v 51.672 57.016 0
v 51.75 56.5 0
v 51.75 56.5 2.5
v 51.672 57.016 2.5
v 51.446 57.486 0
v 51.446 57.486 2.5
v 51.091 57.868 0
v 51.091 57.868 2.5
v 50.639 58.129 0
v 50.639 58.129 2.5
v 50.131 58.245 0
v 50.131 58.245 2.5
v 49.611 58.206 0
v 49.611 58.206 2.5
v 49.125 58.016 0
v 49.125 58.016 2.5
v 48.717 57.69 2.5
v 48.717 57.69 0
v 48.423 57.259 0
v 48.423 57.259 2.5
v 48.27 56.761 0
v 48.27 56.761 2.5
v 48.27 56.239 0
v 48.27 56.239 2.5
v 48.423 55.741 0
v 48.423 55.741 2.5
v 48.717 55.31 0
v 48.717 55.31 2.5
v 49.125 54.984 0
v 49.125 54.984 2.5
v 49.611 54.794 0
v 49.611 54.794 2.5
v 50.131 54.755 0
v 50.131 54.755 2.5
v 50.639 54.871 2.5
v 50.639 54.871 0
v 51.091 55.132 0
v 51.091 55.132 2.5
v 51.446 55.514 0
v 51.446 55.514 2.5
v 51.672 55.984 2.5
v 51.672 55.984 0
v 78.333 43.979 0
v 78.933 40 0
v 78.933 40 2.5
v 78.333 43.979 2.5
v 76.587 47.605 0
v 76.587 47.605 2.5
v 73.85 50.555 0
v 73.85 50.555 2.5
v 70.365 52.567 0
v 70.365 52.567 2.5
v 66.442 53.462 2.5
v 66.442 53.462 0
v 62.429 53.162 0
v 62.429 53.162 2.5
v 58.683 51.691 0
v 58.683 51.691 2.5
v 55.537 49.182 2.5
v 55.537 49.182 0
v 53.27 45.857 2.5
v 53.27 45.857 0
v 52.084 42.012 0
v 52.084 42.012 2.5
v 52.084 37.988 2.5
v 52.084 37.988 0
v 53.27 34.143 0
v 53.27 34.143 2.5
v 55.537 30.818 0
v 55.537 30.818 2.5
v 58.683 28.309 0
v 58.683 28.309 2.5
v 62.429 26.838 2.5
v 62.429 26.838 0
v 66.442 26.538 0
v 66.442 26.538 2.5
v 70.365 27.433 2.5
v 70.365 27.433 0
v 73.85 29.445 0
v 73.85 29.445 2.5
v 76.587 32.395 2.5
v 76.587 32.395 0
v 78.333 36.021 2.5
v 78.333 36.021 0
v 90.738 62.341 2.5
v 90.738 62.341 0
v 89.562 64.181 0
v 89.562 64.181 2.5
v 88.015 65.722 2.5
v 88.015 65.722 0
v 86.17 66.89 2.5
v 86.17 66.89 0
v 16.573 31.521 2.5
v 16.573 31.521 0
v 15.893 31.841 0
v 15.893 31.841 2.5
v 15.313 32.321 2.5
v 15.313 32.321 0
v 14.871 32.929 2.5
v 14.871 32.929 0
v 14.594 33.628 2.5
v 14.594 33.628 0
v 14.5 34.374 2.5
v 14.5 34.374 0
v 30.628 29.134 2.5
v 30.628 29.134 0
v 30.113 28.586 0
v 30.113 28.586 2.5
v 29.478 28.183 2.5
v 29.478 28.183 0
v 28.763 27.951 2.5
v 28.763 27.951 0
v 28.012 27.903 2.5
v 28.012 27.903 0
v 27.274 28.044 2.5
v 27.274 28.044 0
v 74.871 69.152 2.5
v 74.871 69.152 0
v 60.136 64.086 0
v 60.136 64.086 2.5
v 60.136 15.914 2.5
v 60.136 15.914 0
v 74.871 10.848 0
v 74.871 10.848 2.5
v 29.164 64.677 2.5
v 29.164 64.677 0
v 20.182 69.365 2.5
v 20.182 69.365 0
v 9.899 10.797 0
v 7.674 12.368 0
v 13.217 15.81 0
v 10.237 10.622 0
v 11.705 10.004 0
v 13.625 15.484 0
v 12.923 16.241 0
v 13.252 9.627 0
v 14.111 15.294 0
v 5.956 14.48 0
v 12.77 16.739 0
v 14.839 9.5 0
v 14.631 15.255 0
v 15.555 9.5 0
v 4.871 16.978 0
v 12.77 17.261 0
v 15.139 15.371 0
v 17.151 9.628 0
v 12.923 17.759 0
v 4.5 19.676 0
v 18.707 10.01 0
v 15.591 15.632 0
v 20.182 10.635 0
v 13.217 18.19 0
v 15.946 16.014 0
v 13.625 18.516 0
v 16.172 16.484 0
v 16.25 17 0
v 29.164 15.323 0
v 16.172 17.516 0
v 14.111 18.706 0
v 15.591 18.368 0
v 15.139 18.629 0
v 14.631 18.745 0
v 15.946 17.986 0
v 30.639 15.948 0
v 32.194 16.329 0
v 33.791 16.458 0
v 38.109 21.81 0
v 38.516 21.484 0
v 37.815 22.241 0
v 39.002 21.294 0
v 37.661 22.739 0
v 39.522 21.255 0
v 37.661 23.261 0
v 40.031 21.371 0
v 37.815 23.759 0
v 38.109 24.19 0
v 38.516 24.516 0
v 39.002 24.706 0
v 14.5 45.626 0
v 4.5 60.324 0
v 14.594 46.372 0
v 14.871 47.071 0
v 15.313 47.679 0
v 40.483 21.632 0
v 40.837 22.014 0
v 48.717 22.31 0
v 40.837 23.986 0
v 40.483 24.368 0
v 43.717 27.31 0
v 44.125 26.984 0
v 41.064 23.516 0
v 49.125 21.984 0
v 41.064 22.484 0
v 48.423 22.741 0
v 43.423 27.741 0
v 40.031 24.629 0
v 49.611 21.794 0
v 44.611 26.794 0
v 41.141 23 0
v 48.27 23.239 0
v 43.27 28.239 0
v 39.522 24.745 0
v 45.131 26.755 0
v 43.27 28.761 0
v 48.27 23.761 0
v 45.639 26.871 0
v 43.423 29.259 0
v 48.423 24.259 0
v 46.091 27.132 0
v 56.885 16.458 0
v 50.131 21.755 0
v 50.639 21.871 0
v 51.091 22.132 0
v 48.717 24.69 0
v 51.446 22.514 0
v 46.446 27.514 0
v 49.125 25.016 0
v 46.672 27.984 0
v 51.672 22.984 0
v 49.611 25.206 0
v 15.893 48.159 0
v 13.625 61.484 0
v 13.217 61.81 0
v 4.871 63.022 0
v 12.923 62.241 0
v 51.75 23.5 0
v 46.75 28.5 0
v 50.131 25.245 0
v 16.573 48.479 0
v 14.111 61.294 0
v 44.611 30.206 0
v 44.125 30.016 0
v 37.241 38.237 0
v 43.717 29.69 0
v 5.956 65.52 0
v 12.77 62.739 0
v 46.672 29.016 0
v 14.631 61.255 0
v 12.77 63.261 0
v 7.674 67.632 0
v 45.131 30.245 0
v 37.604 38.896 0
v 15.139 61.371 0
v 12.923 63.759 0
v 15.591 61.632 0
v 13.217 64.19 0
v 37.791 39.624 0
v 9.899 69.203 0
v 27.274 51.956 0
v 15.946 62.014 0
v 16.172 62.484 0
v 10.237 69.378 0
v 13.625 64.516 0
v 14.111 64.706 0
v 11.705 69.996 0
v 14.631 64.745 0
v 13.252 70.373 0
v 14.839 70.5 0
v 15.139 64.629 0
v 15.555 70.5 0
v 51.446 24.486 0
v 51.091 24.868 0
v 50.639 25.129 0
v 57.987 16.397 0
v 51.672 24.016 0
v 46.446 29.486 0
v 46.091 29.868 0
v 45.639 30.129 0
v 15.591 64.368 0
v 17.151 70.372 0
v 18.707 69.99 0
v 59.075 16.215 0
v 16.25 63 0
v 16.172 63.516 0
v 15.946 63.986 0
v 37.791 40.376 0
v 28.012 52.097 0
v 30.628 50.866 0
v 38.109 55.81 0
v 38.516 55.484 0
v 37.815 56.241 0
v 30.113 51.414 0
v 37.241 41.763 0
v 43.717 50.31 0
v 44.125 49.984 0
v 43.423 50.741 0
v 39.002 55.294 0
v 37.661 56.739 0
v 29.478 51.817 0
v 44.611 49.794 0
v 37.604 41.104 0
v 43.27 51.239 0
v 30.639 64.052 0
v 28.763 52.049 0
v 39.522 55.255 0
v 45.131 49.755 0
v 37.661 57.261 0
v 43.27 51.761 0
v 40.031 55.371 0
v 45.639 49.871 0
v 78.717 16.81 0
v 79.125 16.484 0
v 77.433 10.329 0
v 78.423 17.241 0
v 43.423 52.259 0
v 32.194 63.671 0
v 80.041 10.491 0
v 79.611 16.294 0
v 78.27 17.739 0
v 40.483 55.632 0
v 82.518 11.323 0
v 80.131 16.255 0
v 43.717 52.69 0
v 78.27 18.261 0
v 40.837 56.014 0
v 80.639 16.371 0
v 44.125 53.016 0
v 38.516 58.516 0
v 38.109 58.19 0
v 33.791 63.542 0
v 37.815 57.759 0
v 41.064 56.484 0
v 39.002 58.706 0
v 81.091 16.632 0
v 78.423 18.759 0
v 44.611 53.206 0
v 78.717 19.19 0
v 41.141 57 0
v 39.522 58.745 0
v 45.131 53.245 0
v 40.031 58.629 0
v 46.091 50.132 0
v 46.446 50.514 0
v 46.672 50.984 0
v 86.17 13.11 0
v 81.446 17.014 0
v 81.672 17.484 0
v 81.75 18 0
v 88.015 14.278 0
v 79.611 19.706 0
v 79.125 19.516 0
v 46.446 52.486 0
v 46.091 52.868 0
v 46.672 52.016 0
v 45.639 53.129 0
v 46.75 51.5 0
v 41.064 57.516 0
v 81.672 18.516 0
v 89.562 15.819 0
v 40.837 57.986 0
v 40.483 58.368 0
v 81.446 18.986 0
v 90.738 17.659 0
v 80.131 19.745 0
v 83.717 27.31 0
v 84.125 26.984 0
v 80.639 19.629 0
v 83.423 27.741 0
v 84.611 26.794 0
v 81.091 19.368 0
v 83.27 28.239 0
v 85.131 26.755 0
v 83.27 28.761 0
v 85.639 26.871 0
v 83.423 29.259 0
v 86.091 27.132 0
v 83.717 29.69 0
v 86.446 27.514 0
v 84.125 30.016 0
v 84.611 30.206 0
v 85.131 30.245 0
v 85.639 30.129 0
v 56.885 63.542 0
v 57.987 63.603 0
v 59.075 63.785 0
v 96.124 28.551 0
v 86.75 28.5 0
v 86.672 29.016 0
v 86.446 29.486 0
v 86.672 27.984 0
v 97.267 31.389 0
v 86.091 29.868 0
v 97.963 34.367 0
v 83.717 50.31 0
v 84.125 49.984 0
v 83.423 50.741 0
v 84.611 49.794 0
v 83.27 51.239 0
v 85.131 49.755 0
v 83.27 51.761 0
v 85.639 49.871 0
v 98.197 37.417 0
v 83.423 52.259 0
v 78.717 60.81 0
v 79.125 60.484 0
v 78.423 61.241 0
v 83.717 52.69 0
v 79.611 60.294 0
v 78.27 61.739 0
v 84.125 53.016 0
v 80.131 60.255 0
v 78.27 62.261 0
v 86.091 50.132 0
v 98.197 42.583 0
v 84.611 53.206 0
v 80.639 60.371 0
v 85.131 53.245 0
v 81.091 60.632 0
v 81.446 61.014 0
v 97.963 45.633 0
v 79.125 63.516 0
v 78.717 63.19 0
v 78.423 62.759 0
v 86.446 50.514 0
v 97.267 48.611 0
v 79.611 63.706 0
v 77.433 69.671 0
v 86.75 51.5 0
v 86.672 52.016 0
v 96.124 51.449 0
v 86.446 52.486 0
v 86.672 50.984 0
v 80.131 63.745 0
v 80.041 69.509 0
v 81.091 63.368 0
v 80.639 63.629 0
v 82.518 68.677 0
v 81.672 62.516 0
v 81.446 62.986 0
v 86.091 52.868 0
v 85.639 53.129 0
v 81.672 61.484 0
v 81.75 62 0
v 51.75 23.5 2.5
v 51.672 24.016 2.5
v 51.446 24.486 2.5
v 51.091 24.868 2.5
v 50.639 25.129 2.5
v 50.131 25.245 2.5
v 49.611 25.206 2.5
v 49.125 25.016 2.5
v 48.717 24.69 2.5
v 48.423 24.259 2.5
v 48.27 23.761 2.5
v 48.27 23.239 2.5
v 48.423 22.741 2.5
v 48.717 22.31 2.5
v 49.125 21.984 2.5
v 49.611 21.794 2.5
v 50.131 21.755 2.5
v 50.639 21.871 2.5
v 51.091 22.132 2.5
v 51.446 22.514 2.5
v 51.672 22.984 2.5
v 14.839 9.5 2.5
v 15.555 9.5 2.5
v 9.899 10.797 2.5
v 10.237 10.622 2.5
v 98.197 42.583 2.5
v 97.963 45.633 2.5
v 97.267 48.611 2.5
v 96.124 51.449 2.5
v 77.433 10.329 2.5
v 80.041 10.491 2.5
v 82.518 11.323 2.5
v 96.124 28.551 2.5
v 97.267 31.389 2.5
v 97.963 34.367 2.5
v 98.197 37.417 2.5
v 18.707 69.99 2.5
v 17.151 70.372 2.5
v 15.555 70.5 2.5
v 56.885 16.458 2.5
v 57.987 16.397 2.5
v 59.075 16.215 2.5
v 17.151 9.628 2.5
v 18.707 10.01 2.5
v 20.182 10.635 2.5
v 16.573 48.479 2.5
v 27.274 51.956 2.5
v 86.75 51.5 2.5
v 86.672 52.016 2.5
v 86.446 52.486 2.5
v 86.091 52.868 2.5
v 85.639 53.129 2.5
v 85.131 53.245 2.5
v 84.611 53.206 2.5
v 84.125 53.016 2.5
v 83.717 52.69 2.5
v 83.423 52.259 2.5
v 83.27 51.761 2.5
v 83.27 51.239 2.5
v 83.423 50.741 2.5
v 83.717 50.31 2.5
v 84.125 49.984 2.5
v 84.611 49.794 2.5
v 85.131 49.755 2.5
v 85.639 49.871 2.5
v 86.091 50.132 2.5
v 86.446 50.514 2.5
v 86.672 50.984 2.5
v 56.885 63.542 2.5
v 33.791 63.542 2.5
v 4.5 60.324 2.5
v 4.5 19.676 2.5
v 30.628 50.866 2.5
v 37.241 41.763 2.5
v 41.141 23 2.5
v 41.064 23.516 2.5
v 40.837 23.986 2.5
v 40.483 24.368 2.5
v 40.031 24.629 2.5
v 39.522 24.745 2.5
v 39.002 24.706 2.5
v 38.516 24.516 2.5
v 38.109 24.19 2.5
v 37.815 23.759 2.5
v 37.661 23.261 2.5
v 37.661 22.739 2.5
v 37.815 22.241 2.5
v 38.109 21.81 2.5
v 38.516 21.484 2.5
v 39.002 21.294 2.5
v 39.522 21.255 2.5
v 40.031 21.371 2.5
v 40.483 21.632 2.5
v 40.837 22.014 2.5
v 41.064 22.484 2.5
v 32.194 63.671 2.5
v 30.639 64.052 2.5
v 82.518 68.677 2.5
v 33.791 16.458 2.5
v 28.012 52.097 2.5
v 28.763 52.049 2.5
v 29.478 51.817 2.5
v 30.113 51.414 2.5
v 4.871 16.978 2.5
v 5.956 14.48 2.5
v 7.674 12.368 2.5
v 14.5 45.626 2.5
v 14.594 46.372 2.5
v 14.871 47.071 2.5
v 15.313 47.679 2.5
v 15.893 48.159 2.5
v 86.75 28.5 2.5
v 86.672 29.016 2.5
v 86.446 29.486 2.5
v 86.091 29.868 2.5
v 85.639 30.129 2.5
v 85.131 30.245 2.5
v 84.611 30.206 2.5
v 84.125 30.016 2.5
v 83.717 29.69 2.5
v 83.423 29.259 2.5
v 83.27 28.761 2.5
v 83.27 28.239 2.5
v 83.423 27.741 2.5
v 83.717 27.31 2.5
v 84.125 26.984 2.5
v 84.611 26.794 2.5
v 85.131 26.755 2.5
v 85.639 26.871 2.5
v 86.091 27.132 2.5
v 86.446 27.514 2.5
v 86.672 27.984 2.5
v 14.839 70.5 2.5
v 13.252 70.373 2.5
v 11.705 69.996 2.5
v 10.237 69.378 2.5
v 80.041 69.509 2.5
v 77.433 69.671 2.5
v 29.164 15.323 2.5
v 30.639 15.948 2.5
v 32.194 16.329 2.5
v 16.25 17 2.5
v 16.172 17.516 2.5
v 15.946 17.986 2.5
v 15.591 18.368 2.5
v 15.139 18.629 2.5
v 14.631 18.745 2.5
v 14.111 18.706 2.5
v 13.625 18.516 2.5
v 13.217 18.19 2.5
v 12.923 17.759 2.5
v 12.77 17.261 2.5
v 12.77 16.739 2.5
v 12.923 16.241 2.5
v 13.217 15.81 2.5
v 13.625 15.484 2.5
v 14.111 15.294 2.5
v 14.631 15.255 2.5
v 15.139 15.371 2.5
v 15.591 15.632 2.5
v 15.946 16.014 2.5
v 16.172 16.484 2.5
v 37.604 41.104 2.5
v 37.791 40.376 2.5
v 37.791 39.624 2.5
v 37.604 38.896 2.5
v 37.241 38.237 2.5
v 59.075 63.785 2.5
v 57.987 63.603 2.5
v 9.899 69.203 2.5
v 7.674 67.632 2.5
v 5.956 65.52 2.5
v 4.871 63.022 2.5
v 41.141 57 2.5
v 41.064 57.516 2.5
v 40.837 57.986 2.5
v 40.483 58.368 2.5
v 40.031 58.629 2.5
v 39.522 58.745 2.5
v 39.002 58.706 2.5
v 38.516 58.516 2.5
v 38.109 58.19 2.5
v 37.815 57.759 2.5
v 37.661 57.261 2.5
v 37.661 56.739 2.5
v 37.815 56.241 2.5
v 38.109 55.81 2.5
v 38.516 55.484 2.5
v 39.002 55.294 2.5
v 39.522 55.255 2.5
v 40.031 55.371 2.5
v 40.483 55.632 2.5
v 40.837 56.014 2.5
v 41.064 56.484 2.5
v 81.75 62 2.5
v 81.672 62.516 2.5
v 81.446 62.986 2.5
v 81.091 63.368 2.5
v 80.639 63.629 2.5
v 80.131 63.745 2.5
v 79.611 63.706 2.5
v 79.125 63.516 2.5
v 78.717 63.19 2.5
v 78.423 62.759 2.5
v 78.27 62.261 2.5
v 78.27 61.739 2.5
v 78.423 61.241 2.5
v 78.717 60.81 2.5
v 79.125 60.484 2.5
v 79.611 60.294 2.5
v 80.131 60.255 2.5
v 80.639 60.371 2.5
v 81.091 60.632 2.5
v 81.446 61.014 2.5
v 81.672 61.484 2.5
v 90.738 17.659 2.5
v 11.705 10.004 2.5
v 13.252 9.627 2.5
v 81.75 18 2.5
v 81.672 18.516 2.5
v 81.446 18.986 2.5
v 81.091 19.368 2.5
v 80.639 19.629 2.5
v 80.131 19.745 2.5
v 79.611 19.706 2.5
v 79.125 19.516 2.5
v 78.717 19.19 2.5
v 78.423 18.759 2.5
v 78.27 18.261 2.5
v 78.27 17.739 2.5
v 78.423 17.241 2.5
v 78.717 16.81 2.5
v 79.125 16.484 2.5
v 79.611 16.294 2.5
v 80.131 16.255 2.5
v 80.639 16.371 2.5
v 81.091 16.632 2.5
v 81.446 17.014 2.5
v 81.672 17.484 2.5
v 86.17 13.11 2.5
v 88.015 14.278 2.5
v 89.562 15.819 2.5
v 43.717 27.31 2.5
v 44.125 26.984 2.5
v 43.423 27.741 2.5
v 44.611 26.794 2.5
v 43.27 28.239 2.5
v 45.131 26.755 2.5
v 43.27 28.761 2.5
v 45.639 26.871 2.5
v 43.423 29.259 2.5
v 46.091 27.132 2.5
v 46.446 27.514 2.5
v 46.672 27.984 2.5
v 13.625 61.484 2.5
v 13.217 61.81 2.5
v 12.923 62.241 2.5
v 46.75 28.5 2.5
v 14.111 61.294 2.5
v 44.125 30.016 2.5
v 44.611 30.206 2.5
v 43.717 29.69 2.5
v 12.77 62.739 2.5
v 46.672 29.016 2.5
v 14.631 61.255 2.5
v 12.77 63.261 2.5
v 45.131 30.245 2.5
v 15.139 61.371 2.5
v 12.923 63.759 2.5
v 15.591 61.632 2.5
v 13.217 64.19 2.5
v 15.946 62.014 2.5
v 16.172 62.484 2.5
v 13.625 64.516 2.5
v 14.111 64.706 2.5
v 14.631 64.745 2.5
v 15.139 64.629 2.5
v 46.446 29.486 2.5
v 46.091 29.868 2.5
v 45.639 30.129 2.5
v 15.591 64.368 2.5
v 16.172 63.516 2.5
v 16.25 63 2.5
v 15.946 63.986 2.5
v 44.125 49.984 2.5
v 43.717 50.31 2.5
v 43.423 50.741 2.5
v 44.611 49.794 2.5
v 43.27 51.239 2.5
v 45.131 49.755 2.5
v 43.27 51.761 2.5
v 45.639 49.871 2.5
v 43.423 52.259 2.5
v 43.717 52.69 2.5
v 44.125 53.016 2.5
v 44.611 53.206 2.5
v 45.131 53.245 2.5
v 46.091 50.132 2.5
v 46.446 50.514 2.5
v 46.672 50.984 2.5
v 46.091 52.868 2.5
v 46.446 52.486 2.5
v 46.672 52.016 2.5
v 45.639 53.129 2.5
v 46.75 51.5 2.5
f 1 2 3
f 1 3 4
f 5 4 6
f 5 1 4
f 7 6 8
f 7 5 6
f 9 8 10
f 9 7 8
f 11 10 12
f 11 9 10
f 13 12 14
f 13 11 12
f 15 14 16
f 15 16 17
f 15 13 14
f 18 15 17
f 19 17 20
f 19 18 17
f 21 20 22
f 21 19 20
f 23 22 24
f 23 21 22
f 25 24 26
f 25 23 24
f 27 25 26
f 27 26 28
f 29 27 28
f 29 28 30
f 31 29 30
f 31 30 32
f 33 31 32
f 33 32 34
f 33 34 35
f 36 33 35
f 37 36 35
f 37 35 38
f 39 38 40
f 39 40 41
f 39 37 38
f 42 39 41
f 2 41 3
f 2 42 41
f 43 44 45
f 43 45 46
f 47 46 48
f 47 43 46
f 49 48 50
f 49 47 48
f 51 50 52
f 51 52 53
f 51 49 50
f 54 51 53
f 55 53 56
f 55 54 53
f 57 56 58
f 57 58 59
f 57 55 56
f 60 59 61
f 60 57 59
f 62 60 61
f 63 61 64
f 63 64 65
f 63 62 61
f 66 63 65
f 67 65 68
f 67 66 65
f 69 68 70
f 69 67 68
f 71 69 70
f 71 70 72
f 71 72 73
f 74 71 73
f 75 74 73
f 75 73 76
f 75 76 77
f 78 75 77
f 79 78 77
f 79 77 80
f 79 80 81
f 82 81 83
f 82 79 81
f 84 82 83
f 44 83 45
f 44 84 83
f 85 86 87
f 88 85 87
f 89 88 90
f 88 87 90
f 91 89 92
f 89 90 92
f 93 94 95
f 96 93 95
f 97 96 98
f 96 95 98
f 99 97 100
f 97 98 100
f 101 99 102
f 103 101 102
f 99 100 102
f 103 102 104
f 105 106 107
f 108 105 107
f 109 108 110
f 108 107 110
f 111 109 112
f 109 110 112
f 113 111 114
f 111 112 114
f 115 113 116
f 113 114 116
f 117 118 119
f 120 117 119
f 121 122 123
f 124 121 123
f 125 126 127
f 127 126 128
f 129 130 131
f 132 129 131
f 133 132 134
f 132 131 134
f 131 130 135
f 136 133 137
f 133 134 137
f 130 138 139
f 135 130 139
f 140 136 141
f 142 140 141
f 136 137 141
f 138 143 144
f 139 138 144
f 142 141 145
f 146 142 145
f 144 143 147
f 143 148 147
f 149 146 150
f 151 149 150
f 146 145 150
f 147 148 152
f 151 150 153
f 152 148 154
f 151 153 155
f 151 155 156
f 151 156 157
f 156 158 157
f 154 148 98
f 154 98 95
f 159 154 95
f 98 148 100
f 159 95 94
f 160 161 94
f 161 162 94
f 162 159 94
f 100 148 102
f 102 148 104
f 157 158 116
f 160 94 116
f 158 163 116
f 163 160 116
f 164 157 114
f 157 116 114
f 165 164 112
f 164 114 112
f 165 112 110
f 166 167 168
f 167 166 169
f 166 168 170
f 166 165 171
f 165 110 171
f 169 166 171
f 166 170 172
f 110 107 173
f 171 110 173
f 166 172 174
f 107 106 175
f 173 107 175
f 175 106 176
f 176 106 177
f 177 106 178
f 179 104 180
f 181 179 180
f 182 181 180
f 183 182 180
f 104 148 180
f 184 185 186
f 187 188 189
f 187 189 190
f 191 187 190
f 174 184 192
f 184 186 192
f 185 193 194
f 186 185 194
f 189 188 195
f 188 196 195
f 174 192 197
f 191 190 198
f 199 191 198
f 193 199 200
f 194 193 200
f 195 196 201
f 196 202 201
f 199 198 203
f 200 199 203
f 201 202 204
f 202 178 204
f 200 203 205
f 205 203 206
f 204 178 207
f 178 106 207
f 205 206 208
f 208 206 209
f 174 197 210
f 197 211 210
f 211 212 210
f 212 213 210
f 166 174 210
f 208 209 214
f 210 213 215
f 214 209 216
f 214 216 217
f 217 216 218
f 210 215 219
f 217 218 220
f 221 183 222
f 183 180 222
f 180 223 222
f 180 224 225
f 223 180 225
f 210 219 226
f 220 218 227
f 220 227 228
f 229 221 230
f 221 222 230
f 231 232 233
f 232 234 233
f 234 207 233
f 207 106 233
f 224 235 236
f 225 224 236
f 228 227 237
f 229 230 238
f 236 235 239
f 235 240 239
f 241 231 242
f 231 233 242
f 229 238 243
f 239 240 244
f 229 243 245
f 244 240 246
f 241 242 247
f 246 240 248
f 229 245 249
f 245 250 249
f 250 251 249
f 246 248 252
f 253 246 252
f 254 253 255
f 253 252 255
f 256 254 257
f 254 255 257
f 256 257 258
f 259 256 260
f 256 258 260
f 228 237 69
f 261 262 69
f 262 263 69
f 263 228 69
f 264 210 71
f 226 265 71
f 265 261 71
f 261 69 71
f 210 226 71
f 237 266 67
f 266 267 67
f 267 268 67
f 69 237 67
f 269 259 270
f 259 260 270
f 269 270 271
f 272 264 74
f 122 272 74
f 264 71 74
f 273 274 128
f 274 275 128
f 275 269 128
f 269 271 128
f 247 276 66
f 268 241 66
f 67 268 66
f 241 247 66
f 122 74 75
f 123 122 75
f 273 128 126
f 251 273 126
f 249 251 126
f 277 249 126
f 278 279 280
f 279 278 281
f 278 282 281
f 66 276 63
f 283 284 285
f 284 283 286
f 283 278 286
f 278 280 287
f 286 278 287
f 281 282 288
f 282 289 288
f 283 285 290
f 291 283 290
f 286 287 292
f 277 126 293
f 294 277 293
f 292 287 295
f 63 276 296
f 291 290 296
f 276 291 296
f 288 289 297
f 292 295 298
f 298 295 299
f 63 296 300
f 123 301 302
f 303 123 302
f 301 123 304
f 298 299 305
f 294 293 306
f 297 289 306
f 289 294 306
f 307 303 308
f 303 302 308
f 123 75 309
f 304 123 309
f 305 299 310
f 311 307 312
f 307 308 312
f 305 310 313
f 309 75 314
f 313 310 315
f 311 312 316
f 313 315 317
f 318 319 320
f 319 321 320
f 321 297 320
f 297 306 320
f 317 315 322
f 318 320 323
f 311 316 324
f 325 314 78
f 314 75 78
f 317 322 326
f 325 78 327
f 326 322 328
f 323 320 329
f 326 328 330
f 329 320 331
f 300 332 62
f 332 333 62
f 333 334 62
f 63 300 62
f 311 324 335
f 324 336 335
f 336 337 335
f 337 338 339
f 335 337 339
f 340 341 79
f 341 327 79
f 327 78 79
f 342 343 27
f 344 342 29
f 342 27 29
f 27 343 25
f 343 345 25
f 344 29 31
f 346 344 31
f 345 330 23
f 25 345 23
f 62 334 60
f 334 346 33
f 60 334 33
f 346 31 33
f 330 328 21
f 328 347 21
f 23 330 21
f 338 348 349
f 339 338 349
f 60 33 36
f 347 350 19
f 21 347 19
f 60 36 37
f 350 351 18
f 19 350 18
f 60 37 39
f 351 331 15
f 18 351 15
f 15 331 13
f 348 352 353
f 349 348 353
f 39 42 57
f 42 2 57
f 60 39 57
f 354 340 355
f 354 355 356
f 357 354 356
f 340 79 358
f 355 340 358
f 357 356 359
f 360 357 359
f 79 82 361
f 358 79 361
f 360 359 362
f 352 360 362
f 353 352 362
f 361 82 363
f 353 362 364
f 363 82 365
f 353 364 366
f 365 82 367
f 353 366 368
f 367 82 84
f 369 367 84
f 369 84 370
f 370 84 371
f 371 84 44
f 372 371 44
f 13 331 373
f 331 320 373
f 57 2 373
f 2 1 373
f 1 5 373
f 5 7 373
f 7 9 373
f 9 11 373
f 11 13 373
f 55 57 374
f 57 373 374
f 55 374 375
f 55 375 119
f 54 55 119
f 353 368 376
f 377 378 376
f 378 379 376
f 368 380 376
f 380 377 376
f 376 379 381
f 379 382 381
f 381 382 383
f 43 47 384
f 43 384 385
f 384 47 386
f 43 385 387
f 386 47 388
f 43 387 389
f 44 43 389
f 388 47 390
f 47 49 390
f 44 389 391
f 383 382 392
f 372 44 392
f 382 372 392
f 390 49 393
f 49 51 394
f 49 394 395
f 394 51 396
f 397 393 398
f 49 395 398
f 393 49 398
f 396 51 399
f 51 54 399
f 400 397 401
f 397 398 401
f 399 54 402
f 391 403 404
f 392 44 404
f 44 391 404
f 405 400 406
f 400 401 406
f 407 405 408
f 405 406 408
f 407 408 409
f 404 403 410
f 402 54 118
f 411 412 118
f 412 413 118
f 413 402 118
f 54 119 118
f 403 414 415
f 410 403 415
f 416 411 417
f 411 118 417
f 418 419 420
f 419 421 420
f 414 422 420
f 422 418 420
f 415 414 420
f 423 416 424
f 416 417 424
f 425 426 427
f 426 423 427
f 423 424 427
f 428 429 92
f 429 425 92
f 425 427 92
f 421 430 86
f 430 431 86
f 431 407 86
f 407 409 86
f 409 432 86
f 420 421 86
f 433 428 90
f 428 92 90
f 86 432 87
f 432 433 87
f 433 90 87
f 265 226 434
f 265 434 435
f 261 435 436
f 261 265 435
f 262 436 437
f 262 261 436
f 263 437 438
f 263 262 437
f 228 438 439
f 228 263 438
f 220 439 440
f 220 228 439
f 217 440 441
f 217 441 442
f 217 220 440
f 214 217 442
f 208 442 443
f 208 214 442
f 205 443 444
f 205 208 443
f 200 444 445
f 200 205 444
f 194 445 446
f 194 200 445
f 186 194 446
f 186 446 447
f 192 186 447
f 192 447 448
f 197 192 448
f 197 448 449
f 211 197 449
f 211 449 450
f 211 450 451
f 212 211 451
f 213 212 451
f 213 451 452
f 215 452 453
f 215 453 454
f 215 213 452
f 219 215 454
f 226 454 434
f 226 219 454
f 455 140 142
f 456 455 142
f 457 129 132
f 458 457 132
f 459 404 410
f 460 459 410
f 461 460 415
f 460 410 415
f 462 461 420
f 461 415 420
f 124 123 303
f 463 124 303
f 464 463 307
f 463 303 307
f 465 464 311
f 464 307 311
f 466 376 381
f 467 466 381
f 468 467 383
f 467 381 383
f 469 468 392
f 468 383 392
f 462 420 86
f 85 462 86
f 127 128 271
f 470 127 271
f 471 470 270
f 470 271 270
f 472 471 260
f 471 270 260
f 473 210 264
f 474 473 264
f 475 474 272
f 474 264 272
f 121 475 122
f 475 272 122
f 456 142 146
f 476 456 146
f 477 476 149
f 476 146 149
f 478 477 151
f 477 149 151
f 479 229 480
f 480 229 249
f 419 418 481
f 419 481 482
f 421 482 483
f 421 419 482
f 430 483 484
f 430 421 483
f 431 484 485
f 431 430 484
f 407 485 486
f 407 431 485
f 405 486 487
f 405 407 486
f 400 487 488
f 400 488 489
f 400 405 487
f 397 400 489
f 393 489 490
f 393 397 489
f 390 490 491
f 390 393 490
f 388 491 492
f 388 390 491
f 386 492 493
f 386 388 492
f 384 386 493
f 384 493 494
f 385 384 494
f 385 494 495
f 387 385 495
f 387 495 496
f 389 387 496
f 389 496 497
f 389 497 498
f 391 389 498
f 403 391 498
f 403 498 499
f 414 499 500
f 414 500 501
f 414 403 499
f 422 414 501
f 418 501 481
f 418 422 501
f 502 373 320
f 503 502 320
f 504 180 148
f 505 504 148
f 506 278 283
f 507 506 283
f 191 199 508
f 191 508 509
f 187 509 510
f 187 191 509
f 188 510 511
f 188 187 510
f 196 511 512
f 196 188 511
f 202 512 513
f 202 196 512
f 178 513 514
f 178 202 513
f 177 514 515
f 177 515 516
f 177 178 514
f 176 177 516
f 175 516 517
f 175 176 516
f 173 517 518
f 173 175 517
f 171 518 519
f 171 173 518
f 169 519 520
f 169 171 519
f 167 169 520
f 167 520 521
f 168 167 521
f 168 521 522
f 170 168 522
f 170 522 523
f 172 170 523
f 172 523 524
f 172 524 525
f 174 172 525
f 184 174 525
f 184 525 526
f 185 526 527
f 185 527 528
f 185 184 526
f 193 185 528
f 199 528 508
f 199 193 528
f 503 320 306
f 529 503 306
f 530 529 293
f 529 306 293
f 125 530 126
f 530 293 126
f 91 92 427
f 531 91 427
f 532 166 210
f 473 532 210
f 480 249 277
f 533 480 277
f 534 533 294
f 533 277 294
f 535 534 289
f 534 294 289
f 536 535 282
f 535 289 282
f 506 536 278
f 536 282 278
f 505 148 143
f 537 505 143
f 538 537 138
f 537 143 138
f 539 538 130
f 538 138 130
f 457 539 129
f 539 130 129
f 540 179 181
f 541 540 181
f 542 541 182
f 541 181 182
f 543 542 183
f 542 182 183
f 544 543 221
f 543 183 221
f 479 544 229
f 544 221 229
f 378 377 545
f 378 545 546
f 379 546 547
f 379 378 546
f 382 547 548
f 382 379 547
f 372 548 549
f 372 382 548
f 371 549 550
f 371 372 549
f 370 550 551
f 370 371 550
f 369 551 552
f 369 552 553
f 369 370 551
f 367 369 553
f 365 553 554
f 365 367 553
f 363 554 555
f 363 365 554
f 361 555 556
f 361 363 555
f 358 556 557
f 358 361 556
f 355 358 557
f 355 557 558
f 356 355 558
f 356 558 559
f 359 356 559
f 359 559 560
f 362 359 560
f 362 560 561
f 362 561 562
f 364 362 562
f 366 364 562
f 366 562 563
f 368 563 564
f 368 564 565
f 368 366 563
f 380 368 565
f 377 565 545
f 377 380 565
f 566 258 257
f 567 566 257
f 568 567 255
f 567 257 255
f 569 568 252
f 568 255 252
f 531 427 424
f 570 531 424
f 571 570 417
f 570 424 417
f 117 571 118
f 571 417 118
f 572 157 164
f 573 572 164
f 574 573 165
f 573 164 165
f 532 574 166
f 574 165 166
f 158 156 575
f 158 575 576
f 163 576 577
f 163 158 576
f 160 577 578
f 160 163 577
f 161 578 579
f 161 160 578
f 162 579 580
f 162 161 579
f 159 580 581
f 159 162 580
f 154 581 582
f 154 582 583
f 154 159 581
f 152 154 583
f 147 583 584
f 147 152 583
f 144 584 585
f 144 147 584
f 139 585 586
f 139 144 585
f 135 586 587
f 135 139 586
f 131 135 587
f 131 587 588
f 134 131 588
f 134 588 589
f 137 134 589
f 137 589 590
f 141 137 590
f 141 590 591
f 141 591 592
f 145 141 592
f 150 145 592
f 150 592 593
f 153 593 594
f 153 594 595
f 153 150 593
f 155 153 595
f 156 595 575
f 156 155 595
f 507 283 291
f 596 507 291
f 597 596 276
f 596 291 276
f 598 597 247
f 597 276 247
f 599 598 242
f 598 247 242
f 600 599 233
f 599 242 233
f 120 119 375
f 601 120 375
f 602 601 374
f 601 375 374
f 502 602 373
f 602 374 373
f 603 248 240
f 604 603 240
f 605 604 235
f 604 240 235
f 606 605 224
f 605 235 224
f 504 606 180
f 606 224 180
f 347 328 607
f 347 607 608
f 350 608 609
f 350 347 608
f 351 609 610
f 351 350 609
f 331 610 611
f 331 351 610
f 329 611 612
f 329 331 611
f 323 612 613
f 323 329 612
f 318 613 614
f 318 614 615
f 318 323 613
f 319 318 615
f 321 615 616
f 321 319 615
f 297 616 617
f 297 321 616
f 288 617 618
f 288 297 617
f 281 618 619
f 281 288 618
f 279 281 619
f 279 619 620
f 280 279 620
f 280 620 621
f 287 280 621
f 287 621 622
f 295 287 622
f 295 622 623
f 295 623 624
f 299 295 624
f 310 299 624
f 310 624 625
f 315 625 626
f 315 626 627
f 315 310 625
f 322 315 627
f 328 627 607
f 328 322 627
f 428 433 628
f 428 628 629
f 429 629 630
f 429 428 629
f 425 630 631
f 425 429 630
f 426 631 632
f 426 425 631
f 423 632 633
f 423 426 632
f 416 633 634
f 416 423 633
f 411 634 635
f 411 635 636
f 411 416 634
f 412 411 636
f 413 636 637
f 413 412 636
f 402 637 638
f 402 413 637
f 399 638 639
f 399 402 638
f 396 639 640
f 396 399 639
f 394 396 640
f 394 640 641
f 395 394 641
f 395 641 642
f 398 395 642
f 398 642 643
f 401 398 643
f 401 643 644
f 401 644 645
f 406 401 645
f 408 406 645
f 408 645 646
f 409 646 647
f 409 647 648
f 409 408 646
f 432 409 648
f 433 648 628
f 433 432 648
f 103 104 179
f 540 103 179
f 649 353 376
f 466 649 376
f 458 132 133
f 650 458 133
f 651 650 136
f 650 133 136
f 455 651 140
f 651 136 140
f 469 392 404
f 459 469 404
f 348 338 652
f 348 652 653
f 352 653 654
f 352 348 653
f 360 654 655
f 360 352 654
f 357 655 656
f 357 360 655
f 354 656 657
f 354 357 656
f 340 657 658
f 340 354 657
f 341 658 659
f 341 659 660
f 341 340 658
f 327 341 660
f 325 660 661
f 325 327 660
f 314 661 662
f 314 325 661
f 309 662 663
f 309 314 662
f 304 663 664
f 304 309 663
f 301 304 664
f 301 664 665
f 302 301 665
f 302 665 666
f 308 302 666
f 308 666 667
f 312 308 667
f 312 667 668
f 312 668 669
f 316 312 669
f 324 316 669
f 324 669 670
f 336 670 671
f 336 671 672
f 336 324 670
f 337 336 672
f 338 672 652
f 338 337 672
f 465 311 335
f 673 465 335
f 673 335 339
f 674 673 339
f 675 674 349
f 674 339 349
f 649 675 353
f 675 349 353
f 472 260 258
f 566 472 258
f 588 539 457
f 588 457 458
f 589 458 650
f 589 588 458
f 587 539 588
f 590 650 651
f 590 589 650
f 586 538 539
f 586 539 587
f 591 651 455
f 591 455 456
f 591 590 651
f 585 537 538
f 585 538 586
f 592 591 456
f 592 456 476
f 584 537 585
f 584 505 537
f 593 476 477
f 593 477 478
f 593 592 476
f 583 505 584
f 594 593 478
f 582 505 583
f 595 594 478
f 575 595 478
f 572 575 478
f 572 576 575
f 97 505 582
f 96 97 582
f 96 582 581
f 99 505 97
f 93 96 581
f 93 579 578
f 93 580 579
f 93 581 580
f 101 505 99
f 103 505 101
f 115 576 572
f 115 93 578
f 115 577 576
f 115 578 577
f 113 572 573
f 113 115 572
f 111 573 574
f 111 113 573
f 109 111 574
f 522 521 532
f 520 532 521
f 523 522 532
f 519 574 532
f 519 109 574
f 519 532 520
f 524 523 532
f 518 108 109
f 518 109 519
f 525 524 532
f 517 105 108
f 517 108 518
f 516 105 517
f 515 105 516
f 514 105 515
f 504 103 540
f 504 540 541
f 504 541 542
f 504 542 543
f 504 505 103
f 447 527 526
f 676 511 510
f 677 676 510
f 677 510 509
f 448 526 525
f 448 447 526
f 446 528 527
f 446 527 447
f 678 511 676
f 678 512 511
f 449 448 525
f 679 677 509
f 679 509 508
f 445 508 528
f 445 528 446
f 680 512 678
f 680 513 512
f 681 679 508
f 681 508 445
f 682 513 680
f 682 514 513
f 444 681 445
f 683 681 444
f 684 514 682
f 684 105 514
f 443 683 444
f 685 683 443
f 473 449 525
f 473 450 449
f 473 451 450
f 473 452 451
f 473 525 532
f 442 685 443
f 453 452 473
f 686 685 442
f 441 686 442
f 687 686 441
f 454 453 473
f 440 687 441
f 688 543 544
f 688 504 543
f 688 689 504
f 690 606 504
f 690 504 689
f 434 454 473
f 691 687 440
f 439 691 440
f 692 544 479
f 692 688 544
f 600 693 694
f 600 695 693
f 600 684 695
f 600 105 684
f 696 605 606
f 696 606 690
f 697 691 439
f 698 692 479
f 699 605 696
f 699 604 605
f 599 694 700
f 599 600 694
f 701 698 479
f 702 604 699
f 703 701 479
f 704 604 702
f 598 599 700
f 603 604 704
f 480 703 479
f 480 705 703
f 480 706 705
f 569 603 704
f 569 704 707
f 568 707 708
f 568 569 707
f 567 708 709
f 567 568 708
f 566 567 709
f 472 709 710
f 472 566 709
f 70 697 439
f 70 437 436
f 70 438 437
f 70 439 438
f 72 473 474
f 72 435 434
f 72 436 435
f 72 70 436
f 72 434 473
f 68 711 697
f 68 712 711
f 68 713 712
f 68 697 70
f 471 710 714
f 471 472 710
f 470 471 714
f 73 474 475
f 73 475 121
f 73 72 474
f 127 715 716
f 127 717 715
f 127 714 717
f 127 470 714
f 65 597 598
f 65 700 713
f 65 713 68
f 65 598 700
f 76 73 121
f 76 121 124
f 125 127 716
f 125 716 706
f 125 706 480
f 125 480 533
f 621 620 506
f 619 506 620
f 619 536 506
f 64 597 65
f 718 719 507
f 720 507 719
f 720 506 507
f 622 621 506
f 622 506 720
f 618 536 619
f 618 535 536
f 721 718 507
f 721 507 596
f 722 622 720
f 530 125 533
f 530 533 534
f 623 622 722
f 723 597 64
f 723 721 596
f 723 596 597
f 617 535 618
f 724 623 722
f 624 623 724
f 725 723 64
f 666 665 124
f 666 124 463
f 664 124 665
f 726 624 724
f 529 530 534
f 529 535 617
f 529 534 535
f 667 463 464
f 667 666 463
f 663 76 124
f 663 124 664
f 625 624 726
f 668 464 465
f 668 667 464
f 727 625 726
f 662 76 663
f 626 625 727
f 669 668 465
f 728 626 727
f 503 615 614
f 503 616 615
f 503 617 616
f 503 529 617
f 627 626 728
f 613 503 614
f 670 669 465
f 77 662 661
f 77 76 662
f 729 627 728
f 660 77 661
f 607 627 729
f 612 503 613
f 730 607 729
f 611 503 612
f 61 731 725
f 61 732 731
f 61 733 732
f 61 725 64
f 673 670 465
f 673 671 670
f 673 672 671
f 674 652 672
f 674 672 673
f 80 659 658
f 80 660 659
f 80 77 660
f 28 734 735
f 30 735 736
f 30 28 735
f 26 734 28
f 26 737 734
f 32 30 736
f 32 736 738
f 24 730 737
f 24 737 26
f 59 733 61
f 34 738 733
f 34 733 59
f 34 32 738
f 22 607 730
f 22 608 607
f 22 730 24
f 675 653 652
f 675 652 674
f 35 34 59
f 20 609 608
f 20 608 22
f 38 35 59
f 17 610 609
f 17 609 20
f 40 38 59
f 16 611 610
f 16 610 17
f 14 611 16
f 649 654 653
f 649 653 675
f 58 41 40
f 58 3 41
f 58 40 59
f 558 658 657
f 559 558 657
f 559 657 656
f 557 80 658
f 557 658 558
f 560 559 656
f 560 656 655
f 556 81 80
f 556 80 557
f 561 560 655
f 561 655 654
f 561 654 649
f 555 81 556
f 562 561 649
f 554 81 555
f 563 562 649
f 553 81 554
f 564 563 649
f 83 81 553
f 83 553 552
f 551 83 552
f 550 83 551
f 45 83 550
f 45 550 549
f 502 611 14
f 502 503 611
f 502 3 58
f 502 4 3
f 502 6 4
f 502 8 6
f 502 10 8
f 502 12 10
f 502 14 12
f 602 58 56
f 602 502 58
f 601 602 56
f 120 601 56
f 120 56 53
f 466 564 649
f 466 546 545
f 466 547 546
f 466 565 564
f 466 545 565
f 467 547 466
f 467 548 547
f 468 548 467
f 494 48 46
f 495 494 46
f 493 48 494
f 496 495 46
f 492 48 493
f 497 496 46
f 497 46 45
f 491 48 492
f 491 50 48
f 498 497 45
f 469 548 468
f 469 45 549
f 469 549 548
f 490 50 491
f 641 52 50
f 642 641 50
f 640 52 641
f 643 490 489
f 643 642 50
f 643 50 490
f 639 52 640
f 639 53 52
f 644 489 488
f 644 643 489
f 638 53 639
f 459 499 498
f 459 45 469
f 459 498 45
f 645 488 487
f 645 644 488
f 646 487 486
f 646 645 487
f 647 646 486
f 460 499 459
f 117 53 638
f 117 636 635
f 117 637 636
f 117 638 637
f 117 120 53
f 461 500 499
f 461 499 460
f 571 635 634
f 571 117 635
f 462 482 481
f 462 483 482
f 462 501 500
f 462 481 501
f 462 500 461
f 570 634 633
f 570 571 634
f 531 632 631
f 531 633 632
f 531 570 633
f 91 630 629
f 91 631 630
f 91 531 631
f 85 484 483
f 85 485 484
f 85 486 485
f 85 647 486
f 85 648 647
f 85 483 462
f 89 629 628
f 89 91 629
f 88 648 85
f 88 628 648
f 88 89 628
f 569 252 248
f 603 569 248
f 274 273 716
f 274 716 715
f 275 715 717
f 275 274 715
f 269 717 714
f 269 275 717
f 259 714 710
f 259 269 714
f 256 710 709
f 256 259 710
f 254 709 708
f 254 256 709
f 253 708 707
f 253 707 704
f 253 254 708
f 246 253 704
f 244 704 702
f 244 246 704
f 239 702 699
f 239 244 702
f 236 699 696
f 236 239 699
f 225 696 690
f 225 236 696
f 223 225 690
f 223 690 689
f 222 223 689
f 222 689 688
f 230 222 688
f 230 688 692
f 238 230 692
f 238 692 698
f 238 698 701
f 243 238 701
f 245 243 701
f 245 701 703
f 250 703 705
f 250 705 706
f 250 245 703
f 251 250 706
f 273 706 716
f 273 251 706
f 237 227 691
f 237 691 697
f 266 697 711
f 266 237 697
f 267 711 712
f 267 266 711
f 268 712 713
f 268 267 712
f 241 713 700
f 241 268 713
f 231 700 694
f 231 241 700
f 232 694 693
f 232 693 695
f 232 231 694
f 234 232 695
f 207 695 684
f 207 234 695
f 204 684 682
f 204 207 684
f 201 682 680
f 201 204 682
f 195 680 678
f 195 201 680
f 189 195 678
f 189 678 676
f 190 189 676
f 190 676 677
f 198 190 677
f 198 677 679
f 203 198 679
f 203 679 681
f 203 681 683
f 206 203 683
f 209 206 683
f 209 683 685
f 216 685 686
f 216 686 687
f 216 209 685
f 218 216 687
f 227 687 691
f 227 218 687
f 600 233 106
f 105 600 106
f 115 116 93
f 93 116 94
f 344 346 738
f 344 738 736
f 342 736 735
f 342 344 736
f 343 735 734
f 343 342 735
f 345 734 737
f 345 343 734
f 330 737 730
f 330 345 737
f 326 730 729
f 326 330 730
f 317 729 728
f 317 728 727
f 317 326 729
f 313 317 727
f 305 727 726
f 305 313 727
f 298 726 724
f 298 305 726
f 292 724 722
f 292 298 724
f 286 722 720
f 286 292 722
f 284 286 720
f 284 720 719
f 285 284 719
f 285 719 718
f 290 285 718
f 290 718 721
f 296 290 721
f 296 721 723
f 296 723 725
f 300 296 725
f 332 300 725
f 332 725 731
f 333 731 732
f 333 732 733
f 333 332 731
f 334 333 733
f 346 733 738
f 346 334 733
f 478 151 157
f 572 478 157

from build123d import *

# Parameters (mm, degrees)
F1_R     = 1.75
F1_R_2   = 13.5
F2_DEPTH = 2.5


with BuildPart() as f2:
    # F1 (on Top) → F2 (new body)
    with BuildSketch(Plane.XY):
        with BuildLine():
            Line((10.2372021925, 69.3784194525), (9.8985145849, 69.2028852716))
            ThreePointArc((9.8985145849, 69.2028852716), (5.955561629, 65.5199035219), (4.5, 60.324465819))
            Line((4.5, 60.324465819), (4.5, 40))
            Line((4.5, 40), (4.5, 19.675534181))
            ThreePointArc((4.5, 19.675534181), (5.955561629, 14.4800964781), (9.8985145849, 10.7971147284))
            Line((9.8985145849, 10.7971147284), (10.2372021925, 10.6215805475))
            ThreePointArc((10.2372021925, 10.6215805475), (12.470586525, 9.7844404555), (14.8386876076, 9.5))
            Line((14.8386876076, 9.5), (15.5546120462, 9.5))
            ThreePointArc((15.5546120462, 9.5), (17.9366290245, 9.7878429216), (20.1815166575, 10.634800977))
            Line((20.1815166575, 10.634800977), (29.1640234003, 15.322930568))
            ThreePointArc((29.1640234003, 15.322930568), (31.4089110333, 16.1698886233), (33.7909280117, 16.457731545))
            Line((33.7909280117, 16.457731545), (56.8851493299, 16.457731545))
            ThreePointArc((56.8851493299, 16.457731545), (58.5333421059, 16.3209693791), (60.1364527991, 15.9144236596))
            Line((60.1364527991, 15.9144236596), (74.8714324464, 10.8483931845))
            ThreePointArc((74.8714324464, 10.8483931845), (78.7421893122, 10.3242898655), (82.518433429, 11.3230007209))
            Line((82.518433429, 11.3230007209), (86.1698560542, 13.1099522035))
            ThreePointArc((86.1698560542, 13.1099522035), (88.830601645, 15.0063744472), (90.7380024689, 17.6592608982))
            Line((90.7380024689, 17.6592608982), (96.1243657197, 28.5514243616))
            ThreePointArc((96.1243657197, 28.5514243616), (97.6717100474, 32.8647106004), (98.1966778636, 37.4169761286))
            Line((98.1966778636, 37.4169761286), (98.1966778636, 40))
            Line((98.1966778636, 40), (98.1966778636, 42.5830238714))
            ThreePointArc((98.1966778636, 42.5830238714), (97.6717100474, 47.1352893996), (96.1243657197, 51.4485756384))
            Line((96.1243657197, 51.4485756384), (90.7380024689, 62.3407391018))
            ThreePointArc((90.7380024689, 62.3407391018), (88.830601645, 64.9936255528), (86.1698560542, 66.8900477965))
            Line((86.1698560542, 66.8900477965), (82.518433429, 68.6769992791))
            ThreePointArc((82.518433429, 68.6769992791), (78.7421893122, 69.6757101345), (74.8714324464, 69.1516068155))
            Line((74.8714324464, 69.1516068155), (60.1364527991, 64.0855763404))
            ThreePointArc((60.1364527991, 64.0855763404), (58.5333421059, 63.6790306209), (56.8851493299, 63.542268455))
            Line((56.8851493299, 63.542268455), (33.7909280117, 63.542268455))
            ThreePointArc((33.7909280117, 63.542268455), (31.4089110333, 63.8301113767), (29.1640234003, 64.677069432))
            Line((29.1640234003, 64.677069432), (20.1815166575, 69.365199023))
            ThreePointArc((20.1815166575, 69.365199023), (17.9366290245, 70.2121570784), (15.5546120462, 70.5))
            Line((15.5546120462, 70.5), (14.8386876076, 70.5))
            ThreePointArc((14.8386876076, 70.5), (12.470586525, 70.2155595445), (10.2372021925, 69.3784194525))
        make_face()
        with Locations((14.5, 17)):
            Circle(F1_R, mode=Mode.SUBTRACT)
        with Locations((39.3913947046, 23)):
            Circle(F1_R, mode=Mode.SUBTRACT)
        with Locations((50, 23.5)):
            Circle(F1_R, mode=Mode.SUBTRACT)
        with BuildLine():
            ThreePointArc((27.2737251007, 51.9557933746), (29.1278270669, 51.9557933746), (30.6278270669, 50.8659795825))
            Line((30.6278270669, 50.8659795825), (37.2412703927, 41.7633557569))
            ThreePointArc((37.2412703927, 41.7633557569), (37.8142194096, 40), (37.2412703927, 38.2366442431))
            Line((37.2412703927, 38.2366442431), (30.6278270669, 29.1340204175))
            ThreePointArc((30.6278270669, 29.1340204175), (29.1278270669, 28.0442066254), (27.2737251007, 28.0442066254))
            Line((27.2737251007, 28.0442066254), (16.5729490169, 31.52109954))
            ThreePointArc((16.5729490169, 31.52109954), (15.0729490169, 32.6109133321), (14.5, 34.3742690889))
            Line((14.5, 34.3742690889), (14.5, 45.6257309111))
            ThreePointArc((14.5, 45.6257309111), (15.0729490169, 47.3890866679), (16.5729490169, 48.47890046))
            Line((16.5729490169, 48.47890046), (27.2737251007, 51.9557933746))
        make_face(mode=Mode.SUBTRACT)
        with Locations((45, 28.5)):
            Circle(F1_R, mode=Mode.SUBTRACT)
        with Locations((80, 18)):
            Circle(F1_R, mode=Mode.SUBTRACT)
        with Locations((85, 28.5)):
            Circle(F1_R, mode=Mode.SUBTRACT)
        with Locations((45, 51.5)):
            Circle(F1_R, mode=Mode.SUBTRACT)
        with Locations((14.5, 63)):
            Circle(F1_R, mode=Mode.SUBTRACT)
        with Locations((39.3913947046, 57)):
            Circle(F1_R, mode=Mode.SUBTRACT)
        with Locations((50, 56.5)):
            Circle(F1_R, mode=Mode.SUBTRACT)
        with Locations((65.432921052, 40)):
            Circle(F1_R_2, mode=Mode.SUBTRACT)
        with Locations((85, 51.5)):
            Circle(F1_R, mode=Mode.SUBTRACT)
        with Locations((80, 62)):
            Circle(F1_R, mode=Mode.SUBTRACT)
    extrude(amount=F2_DEPTH)


solid = f2.part
